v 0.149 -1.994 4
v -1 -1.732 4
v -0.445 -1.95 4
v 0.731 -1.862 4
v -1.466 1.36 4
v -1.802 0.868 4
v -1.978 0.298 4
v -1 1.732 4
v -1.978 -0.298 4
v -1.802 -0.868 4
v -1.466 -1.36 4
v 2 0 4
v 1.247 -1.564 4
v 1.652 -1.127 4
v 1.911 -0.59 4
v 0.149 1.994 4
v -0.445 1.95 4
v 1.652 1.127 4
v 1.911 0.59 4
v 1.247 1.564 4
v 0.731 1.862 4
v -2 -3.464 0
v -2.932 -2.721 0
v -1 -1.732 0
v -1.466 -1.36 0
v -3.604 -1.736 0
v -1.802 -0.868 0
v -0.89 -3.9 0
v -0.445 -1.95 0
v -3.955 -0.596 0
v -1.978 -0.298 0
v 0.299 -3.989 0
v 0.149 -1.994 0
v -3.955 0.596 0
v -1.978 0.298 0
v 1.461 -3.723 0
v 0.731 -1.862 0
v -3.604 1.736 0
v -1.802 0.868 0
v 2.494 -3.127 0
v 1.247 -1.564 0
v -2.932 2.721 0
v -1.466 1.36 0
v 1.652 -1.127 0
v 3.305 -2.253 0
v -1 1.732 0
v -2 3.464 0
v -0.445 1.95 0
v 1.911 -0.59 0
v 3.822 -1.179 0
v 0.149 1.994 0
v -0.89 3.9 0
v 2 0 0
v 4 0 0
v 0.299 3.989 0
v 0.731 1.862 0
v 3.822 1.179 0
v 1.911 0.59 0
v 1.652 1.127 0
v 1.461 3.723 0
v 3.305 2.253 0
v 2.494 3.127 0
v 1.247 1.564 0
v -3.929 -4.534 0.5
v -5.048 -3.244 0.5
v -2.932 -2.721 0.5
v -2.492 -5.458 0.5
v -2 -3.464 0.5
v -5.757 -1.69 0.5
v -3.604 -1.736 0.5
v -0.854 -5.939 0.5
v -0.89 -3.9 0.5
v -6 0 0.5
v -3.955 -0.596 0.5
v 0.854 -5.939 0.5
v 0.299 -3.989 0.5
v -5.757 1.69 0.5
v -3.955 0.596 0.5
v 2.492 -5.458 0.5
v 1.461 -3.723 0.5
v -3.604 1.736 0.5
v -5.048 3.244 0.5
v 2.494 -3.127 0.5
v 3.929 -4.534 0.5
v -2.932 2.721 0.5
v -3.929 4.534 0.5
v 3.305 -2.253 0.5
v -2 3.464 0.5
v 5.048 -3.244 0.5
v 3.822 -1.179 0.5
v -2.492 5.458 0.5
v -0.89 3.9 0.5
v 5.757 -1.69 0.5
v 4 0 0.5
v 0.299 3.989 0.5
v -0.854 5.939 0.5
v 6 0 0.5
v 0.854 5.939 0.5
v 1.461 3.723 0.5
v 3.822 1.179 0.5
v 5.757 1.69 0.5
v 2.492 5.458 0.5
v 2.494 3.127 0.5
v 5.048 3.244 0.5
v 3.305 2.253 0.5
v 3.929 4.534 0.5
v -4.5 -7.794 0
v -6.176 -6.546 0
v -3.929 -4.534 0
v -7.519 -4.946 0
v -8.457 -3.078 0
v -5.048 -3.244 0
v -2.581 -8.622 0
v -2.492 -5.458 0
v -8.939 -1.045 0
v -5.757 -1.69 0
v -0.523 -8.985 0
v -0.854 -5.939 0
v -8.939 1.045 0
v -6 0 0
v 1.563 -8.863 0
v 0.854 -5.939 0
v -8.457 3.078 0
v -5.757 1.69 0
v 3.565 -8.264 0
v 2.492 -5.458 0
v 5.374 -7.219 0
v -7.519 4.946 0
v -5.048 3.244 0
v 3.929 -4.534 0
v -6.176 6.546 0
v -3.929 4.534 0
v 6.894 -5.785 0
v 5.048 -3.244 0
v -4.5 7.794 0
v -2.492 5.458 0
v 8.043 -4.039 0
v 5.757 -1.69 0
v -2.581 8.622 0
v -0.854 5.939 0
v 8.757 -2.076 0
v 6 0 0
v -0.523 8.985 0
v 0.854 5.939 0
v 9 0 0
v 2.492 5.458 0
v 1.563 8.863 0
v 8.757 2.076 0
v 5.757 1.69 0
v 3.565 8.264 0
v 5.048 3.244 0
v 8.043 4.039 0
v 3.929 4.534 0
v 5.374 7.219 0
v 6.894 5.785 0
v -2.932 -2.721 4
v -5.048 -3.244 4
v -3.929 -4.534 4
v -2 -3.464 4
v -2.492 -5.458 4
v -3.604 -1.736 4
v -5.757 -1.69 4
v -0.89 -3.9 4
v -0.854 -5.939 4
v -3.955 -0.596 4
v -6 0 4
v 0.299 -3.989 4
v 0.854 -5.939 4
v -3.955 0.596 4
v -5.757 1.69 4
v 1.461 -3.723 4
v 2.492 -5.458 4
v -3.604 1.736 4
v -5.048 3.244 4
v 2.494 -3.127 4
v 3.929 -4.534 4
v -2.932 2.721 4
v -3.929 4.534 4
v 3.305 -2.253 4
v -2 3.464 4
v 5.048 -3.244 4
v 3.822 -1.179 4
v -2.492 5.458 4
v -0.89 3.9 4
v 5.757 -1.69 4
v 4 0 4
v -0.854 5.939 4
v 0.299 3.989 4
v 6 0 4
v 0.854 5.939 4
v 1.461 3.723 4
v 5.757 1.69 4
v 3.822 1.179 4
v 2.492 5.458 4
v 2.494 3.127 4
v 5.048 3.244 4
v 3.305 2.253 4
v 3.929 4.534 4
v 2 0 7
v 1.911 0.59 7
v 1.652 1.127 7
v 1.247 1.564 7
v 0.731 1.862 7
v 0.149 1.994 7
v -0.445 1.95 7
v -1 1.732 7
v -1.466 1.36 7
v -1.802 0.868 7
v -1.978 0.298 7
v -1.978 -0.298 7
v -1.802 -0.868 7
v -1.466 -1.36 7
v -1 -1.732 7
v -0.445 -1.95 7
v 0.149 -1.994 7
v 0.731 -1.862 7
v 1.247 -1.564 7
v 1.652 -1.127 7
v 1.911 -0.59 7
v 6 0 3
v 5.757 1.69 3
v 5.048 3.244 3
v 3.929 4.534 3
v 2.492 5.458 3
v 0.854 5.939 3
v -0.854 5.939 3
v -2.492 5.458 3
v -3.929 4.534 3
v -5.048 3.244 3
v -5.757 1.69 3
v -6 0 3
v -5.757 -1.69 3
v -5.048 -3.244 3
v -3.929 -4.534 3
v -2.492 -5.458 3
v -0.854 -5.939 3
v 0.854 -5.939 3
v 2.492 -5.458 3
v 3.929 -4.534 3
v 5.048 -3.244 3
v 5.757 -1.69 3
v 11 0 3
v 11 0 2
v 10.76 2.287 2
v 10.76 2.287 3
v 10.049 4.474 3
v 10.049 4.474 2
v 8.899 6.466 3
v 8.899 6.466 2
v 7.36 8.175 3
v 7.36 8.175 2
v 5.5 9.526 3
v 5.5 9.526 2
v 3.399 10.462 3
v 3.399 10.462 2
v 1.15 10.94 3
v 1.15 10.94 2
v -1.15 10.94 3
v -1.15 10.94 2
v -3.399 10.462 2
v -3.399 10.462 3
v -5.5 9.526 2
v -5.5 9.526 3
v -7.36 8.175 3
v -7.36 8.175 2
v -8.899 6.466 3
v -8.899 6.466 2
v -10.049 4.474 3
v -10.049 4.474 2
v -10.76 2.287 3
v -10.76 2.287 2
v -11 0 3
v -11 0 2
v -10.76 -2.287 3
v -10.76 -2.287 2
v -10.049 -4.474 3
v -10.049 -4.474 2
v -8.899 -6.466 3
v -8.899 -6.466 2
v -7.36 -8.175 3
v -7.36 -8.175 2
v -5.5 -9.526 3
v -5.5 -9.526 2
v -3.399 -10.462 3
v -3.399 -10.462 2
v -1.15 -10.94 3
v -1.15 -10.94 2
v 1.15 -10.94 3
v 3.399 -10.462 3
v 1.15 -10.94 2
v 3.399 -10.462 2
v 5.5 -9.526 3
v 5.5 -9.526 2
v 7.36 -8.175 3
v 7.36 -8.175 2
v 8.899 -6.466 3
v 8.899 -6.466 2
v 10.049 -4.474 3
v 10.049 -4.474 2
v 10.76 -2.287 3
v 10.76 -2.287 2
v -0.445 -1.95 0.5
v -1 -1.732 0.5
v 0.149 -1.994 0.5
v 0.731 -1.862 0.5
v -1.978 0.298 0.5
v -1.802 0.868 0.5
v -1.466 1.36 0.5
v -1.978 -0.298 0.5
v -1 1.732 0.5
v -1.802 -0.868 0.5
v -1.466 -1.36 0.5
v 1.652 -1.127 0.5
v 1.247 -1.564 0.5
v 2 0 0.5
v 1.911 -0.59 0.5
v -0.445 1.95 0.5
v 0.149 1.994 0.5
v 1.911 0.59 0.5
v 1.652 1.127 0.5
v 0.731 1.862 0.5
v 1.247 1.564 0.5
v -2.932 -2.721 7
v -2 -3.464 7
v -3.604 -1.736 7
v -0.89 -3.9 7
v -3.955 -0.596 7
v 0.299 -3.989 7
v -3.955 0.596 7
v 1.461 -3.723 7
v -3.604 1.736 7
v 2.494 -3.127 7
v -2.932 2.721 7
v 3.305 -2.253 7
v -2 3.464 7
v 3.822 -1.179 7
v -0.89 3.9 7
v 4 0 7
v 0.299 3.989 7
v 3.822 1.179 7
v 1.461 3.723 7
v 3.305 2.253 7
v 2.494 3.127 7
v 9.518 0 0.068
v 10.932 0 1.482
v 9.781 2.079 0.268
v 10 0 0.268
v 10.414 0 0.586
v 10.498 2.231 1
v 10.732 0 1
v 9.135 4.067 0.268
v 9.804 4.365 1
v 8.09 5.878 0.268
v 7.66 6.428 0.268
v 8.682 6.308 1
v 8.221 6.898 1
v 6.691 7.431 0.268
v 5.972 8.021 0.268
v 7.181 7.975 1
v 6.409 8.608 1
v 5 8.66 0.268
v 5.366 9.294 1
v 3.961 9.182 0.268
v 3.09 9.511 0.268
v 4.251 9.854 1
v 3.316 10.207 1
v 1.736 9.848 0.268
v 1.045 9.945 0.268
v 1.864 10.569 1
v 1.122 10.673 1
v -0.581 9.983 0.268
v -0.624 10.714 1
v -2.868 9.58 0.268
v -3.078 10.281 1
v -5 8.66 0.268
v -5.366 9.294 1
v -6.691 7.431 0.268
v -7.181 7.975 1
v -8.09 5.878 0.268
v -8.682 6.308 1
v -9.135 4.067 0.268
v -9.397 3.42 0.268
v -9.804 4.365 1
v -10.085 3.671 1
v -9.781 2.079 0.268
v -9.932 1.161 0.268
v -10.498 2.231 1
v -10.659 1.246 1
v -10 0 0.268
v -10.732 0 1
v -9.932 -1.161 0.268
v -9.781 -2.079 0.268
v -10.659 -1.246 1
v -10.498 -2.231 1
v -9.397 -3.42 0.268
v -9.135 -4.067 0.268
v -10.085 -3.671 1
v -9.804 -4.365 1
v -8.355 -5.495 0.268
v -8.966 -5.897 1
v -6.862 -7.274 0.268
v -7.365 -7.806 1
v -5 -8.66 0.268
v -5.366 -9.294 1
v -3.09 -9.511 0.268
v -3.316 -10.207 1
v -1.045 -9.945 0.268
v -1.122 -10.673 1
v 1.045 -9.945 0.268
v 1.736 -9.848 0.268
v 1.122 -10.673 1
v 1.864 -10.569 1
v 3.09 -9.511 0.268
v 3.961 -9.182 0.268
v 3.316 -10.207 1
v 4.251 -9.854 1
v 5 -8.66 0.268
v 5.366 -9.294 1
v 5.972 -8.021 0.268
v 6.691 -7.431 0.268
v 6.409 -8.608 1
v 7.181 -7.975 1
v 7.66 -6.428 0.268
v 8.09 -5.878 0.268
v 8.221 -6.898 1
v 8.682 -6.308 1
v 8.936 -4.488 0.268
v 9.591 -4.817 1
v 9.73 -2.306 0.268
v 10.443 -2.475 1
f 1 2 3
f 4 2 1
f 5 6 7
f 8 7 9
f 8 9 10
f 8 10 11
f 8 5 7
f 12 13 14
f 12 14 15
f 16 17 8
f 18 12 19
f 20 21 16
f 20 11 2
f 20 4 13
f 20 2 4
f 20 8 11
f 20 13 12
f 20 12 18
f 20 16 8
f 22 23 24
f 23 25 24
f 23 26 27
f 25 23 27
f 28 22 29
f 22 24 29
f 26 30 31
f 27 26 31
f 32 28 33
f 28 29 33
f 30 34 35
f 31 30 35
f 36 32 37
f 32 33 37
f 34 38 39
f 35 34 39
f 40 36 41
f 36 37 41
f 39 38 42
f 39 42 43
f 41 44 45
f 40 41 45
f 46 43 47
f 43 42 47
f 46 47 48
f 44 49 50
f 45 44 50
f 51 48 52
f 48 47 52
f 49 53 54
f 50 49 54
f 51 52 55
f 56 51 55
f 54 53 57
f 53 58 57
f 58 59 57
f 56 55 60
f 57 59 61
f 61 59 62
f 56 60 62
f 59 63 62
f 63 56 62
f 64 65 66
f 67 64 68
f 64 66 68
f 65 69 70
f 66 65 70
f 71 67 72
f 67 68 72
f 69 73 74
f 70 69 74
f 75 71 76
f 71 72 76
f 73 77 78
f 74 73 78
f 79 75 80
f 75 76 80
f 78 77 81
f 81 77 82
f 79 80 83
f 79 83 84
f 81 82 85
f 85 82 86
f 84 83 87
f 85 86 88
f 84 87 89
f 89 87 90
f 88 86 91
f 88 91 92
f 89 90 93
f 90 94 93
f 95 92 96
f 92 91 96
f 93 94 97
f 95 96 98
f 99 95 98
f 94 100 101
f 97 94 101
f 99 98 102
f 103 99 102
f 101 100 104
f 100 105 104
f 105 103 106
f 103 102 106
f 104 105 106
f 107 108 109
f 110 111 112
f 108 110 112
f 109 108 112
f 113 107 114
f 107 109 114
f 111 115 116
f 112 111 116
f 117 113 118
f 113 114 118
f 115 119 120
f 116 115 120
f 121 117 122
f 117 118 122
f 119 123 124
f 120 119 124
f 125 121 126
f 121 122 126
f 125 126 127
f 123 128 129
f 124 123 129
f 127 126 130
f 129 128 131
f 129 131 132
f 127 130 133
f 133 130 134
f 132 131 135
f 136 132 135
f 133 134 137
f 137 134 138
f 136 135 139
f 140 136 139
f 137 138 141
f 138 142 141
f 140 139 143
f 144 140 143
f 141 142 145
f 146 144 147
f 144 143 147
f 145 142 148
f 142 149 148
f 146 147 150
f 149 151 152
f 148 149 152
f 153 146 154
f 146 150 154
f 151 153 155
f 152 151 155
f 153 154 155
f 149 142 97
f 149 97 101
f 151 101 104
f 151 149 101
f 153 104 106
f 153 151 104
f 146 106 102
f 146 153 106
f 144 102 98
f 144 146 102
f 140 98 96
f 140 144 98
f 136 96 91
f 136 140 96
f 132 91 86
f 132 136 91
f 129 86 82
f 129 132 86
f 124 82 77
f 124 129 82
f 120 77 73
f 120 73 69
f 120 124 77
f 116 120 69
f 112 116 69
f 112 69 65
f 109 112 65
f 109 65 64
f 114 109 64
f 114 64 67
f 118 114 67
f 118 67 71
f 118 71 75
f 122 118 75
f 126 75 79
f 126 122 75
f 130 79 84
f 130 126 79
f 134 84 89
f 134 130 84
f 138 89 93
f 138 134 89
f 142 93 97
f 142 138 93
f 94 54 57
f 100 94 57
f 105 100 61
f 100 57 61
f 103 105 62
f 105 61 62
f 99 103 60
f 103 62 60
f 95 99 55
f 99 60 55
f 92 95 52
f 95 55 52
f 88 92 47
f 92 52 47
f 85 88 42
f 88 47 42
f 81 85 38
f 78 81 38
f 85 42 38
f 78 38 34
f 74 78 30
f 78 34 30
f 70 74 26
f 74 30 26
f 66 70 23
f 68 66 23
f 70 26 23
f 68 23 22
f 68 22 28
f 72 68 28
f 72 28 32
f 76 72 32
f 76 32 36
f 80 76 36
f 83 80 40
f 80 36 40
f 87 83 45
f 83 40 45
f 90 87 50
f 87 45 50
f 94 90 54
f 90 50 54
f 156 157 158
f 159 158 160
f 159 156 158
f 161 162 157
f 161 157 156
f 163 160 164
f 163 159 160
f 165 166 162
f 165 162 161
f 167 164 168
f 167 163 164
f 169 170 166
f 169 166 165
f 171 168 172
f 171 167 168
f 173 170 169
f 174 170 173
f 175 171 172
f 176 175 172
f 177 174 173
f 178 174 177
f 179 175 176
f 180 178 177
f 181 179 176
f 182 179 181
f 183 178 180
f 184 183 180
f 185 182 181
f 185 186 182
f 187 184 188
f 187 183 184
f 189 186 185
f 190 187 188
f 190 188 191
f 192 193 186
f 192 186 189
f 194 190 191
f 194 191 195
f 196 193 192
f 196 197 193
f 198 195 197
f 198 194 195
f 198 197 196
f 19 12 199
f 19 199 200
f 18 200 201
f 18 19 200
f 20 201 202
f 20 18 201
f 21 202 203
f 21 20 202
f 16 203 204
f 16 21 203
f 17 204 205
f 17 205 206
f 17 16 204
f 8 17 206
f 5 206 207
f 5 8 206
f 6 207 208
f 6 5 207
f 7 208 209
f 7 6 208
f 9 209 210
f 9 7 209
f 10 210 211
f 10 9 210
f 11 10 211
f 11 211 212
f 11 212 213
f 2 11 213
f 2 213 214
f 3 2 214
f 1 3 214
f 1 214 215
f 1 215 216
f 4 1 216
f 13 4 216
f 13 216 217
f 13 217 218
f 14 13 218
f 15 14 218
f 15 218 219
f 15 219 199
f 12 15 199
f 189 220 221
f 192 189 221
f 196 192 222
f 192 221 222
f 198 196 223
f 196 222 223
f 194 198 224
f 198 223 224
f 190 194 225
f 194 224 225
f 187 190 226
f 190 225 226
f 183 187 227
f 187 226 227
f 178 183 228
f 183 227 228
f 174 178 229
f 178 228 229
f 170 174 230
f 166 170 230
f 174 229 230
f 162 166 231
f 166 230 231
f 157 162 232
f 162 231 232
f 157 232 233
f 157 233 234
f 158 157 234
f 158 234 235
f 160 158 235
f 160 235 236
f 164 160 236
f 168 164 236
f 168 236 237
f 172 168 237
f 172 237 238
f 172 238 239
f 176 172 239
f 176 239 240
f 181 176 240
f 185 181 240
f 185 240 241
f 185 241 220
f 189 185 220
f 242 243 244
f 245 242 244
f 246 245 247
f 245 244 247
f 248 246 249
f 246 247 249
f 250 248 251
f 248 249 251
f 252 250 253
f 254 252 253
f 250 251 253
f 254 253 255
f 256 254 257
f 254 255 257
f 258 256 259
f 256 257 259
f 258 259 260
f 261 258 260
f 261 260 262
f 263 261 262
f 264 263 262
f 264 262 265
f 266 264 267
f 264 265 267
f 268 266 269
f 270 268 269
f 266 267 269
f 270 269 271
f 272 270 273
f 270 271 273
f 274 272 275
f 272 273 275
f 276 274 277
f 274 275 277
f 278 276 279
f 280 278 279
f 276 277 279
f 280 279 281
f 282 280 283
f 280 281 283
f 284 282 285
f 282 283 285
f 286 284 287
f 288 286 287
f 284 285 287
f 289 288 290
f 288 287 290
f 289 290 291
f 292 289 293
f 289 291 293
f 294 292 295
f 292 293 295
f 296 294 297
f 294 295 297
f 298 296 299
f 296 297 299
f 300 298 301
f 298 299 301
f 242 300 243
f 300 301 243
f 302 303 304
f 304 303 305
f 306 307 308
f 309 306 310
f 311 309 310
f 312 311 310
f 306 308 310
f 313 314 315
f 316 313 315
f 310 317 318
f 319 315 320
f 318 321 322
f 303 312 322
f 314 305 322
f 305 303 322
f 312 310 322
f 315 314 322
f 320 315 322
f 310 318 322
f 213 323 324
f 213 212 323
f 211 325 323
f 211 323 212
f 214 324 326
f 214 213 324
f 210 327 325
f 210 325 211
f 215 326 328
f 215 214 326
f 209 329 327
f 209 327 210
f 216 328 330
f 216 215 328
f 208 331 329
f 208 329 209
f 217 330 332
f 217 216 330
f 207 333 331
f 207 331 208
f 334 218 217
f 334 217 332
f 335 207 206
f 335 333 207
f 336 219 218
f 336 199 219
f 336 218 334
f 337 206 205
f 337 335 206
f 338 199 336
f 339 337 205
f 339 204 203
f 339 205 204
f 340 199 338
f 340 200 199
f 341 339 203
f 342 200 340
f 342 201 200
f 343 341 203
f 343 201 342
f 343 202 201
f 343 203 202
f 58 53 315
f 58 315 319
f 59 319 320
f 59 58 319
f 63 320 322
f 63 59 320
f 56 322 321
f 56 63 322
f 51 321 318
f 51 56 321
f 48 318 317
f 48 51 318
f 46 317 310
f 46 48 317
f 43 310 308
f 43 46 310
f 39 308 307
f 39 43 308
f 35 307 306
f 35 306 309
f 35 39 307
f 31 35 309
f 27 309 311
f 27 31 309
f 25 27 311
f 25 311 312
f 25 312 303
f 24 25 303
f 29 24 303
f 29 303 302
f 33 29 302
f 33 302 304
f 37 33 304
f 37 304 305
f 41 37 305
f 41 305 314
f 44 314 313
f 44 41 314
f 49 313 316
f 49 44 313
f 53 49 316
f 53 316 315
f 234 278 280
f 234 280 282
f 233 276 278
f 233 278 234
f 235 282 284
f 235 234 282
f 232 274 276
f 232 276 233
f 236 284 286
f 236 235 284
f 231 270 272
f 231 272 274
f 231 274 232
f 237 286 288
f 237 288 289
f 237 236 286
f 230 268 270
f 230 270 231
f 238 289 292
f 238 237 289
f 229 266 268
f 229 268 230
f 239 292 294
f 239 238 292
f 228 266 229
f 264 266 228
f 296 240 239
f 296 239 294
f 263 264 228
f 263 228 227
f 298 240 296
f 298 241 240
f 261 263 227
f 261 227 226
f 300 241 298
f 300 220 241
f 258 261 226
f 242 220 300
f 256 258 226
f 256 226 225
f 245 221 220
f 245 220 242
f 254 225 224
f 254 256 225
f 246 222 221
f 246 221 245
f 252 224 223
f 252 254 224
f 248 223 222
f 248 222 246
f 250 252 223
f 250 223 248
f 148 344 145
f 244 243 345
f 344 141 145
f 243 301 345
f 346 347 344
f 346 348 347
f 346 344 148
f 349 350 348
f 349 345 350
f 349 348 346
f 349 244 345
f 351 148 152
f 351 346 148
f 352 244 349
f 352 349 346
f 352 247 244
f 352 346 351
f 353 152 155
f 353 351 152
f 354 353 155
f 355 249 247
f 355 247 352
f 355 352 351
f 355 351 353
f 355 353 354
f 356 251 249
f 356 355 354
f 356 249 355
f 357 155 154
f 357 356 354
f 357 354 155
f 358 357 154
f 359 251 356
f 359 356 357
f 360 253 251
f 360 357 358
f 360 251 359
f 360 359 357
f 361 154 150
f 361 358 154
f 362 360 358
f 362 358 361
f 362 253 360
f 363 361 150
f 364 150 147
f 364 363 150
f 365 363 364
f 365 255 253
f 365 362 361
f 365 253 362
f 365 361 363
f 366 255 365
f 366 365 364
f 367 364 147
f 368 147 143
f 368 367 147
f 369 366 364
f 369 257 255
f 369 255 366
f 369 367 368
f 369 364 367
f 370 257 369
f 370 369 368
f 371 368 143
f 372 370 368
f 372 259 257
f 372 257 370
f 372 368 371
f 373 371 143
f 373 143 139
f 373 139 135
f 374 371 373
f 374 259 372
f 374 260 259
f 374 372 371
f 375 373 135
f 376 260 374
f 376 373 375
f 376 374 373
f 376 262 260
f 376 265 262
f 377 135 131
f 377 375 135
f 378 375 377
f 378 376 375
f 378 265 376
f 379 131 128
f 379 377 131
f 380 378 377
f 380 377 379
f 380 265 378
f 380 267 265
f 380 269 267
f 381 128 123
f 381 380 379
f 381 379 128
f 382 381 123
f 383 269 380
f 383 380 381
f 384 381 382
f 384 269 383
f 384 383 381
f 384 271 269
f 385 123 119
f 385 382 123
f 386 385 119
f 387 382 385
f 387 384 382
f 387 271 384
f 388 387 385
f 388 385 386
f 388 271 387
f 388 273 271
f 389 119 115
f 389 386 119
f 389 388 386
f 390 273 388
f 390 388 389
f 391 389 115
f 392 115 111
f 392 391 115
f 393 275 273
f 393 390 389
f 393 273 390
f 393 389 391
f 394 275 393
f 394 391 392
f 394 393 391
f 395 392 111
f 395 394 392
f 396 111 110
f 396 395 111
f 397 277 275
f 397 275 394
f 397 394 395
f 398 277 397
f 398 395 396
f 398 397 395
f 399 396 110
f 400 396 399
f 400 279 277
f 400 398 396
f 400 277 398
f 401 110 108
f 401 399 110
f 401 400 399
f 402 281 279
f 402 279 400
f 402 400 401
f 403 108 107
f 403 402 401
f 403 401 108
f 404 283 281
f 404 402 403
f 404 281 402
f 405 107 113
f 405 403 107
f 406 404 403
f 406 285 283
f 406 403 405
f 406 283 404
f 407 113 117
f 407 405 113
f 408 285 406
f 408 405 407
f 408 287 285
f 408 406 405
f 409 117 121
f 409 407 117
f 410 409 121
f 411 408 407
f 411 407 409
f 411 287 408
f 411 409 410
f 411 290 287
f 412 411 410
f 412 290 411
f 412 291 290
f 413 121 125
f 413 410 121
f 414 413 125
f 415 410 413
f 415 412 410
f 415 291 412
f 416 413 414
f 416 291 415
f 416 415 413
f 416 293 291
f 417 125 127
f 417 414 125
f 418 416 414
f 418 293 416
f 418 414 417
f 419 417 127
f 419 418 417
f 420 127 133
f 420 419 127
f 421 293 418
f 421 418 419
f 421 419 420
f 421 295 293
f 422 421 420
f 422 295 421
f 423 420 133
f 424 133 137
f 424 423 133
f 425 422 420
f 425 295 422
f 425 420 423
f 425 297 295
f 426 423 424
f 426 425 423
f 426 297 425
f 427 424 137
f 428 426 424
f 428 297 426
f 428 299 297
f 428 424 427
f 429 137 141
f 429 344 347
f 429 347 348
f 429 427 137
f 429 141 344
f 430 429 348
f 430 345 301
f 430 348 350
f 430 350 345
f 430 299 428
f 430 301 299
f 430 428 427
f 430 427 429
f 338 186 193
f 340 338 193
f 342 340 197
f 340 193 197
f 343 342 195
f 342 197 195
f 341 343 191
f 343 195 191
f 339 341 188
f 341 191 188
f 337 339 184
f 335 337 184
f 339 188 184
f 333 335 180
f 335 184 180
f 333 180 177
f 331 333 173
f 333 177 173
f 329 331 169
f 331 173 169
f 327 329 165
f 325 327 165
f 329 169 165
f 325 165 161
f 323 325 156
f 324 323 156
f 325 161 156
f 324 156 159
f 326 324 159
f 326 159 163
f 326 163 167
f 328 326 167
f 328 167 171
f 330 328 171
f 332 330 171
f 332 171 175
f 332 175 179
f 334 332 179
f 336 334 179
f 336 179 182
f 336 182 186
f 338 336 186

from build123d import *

# Parameters (mm, degrees)
F0_R     = 4
F0_R_2   = 2
F1_DEPTH = 7
F0_R_3   = 6
F2_DEPTH = 4
F0_R_4   = 11
F3_DEPTH = 3
F4_DEPTH = 4
F5_R     = 2
F6_DEPTH = 0.5


with BuildPart() as f1:
    # F0 (on Top) → F1 (new body)
    with BuildSketch(Plane.XY):
        Circle(F0_R)
        Circle(F0_R_2, mode=Mode.SUBTRACT)
    extrude(amount=F1_DEPTH)

    # F0 (on Top) → F2 (join)
    with BuildSketch(Plane.XY):
        Circle(F0_R_3)
        Circle(F0_R, mode=Mode.SUBTRACT)
    extrude(amount=F2_DEPTH)

    # F0 (on Top) → F3 (join)
    with BuildSketch(Plane.XY):
        Circle(F0_R_4)
        Circle(F0_R_3, mode=Mode.SUBTRACT)
    extrude(amount=F3_DEPTH)

    # F0 (on Top) → F4 (join)
    with BuildSketch(Plane.XY):
        Circle(F0_R_2)
    extrude(amount=F4_DEPTH)

    # F5
    f5_edges = [f1.edges().sort_by_distance(p)[0] for p in [
        (-11, 0, 0),
    ]]
    fillet(f5_edges, radius=F5_R)

    # F0 (on Top) → F6 (cut)
    with BuildSketch(Plane.XY):
        Circle(F0_R_3)
        Circle(F0_R, mode=Mode.SUBTRACT)
        Circle(F0_R_2)
    extrude(amount=F6_DEPTH, mode=Mode.SUBTRACT)


solid = f1.part
